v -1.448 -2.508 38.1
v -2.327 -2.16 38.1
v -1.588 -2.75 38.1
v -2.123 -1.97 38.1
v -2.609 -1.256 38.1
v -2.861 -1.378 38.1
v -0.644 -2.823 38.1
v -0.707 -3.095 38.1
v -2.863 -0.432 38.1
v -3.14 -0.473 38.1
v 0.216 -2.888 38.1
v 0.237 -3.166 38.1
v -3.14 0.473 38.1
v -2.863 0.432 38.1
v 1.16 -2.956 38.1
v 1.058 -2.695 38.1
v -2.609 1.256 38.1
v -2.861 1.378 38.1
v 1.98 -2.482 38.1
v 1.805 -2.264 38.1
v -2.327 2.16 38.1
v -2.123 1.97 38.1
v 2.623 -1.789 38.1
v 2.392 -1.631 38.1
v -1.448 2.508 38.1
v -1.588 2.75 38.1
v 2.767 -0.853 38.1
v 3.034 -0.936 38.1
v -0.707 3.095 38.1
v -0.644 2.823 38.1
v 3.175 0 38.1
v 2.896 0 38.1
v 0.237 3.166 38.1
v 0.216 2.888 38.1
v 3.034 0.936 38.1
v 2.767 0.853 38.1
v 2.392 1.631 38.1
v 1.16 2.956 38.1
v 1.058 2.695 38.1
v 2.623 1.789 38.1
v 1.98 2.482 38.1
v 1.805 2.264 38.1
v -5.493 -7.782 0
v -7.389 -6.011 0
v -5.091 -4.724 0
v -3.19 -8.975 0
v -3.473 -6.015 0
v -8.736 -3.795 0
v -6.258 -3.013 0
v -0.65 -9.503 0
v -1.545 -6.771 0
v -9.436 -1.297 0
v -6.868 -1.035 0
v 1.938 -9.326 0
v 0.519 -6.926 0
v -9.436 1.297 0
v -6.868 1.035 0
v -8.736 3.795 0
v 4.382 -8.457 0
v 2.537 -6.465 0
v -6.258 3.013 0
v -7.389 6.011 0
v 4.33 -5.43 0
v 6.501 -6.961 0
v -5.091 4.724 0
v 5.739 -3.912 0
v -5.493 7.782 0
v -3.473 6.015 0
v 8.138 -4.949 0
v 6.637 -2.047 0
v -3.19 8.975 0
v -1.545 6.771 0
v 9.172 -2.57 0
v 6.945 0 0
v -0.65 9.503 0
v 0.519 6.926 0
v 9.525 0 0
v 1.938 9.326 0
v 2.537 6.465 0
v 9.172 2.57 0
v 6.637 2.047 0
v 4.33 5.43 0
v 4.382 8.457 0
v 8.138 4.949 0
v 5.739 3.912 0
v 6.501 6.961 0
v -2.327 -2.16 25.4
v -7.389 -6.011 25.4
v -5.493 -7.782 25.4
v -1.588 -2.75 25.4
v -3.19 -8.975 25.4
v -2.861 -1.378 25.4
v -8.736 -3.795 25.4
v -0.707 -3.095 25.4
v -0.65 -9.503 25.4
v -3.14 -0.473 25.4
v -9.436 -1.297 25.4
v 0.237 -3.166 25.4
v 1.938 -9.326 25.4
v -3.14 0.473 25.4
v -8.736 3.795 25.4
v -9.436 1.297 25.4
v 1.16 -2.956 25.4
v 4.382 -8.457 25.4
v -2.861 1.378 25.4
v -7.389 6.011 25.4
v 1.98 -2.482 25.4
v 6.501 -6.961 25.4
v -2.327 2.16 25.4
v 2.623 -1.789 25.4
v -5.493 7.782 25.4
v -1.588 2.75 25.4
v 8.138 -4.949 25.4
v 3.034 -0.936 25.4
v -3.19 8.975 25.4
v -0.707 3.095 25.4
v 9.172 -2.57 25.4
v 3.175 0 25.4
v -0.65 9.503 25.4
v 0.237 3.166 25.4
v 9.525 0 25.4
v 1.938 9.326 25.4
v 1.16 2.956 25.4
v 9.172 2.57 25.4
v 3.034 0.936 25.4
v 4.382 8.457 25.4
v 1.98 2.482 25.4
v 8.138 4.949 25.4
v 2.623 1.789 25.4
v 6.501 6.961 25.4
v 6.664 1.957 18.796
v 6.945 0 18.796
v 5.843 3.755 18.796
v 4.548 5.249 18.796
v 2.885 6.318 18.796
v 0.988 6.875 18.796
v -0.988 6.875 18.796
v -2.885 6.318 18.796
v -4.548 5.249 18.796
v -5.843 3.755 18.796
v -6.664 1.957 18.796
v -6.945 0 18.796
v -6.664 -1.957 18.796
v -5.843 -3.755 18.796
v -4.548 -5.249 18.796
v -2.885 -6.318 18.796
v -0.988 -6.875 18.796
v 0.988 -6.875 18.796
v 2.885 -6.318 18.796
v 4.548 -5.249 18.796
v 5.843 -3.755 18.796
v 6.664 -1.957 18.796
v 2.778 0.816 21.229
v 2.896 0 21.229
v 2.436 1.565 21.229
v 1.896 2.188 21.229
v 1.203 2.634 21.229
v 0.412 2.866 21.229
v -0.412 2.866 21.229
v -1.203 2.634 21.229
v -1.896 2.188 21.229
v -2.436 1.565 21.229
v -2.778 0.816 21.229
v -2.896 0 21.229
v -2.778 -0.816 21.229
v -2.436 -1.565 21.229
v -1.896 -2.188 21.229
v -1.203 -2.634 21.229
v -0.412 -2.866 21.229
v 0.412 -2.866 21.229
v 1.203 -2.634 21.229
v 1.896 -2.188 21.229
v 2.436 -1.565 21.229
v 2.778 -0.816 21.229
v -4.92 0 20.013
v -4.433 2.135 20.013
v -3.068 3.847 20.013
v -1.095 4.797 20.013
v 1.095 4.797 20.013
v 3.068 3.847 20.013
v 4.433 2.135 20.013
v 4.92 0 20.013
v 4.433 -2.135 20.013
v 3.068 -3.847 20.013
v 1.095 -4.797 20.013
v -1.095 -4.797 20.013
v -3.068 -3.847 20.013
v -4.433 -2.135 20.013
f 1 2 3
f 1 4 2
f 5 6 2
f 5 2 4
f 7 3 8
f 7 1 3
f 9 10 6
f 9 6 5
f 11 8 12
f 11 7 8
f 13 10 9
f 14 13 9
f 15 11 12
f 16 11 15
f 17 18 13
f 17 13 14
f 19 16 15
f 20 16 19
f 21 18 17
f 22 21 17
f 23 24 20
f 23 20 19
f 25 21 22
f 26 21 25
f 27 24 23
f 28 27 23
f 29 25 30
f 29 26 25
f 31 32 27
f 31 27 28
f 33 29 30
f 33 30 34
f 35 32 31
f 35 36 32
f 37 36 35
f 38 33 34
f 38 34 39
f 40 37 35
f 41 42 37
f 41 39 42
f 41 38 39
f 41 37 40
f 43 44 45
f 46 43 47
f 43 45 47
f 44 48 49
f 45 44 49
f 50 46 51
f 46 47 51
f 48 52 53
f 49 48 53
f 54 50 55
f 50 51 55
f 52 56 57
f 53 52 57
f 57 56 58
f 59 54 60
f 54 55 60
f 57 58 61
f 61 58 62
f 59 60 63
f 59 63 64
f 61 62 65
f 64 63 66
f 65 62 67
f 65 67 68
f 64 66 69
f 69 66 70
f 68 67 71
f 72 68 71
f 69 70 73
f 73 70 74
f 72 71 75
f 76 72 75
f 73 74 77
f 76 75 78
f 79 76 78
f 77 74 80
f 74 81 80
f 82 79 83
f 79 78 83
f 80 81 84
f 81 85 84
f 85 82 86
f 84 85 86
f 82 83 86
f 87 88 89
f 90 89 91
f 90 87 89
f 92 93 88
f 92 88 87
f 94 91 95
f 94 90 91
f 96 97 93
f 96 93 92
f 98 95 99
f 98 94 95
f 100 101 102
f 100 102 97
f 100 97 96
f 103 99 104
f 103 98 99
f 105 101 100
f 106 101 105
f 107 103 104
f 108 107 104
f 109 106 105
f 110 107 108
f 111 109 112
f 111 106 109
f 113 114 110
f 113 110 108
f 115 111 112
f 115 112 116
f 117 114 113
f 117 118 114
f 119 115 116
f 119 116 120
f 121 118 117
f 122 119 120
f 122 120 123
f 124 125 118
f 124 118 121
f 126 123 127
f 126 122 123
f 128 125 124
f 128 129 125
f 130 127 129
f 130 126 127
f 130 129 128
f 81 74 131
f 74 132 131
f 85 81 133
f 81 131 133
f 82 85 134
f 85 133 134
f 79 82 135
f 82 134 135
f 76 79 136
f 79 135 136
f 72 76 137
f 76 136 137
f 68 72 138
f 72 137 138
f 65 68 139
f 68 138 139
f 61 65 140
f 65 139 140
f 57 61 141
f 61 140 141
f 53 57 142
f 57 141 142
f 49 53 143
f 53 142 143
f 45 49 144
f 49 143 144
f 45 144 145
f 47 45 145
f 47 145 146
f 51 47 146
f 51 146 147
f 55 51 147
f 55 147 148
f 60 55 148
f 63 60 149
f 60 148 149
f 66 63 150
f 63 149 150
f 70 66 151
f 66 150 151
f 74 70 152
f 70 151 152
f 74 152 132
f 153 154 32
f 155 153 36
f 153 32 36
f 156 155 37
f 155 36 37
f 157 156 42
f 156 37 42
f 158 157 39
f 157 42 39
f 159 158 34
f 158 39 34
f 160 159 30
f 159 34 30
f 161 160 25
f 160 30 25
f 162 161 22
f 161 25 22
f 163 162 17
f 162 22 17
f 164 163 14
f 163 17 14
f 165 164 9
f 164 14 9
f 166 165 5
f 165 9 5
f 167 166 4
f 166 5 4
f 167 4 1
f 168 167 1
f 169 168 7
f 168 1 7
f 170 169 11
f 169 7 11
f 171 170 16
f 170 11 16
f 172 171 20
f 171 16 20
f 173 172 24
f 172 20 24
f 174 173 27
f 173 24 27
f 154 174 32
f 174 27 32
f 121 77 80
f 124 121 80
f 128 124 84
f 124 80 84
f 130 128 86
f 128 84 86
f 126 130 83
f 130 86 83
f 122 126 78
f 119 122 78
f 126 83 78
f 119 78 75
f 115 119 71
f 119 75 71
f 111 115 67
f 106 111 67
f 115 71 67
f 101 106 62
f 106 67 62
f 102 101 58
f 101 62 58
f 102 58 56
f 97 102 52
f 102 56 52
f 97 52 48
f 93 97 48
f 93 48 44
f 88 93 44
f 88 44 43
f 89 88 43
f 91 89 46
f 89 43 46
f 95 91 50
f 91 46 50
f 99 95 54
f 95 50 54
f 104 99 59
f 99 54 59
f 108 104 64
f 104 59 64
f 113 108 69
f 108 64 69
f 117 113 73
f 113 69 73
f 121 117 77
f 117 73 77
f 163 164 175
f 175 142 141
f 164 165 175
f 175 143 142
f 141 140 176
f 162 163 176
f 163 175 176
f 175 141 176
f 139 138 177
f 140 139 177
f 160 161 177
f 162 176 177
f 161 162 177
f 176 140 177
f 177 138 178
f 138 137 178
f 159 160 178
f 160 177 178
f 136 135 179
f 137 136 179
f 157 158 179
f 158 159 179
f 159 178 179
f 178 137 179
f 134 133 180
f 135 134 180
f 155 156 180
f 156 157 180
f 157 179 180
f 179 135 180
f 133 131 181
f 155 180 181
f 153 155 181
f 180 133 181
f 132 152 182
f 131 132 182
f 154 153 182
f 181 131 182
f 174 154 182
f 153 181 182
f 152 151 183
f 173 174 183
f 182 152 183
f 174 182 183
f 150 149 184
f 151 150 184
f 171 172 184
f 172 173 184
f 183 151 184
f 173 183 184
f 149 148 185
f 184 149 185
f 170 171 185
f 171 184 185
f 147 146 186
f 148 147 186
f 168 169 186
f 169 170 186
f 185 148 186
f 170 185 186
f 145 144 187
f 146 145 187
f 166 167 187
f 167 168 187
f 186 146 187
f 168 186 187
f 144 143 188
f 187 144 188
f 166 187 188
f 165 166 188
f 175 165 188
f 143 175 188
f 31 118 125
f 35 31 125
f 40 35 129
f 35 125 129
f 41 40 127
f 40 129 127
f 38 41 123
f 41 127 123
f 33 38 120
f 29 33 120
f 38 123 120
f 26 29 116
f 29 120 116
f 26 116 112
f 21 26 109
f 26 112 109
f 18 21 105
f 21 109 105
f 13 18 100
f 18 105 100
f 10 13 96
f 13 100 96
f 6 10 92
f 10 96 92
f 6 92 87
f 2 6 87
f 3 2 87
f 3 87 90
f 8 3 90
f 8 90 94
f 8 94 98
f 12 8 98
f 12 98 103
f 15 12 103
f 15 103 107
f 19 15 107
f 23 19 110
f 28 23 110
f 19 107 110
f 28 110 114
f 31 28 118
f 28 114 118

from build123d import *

# Parameters (mm, degrees)
SKETCH1_R                            = 9.525
BOSS_EXTRUDE1_DEPTH                  = 25.4
SKETCH2_R                            = 3.175
BOSS_EXTRUDE2_DEPTH                  = 12.7
F_1_0_228_DIAMETER_HOLE1_D           = 5.7912
F_35_64_0_54688_DIAMETER_HOLE1_D     = 13.890752
F_35_64_0_54688_DIAMETER_HOLE1_DEPTH = 18.796
F_35_64_0_54688_DIAMETER_HOLE1_TIP   = 4.173202923


with BuildPart() as part:
    # Sketch1 → Boss-Extrude1 (new body)
    with BuildSketch(Plane.XY):
        Circle(SKETCH1_R)
    extrude(amount=BOSS_EXTRUDE1_DEPTH)

    # Sketch2 → Boss-Extrude2 (add)
    with BuildSketch(Plane.XY.offset(25.4)):
        Circle(SKETCH2_R)
    extrude(amount=BOSS_EXTRUDE2_DEPTH)

    # #1 (0.228) Diameter Hole1 (through all)
    with Locations(Plane(origin=(0, 0, 0), x_dir=(-1, 0, 0), z_dir=(0, 0, -1))):
        with Locations((0, 0)):
            Hole(F_1_0_228_DIAMETER_HOLE1_D / 2)

    # 35/64 (0.54688) Diameter Hole1
    with Locations(Plane(origin=(0, 0, 0), x_dir=(-1, 0, 0), z_dir=(0, 0, -1))):
        with Locations((0, 0)):
            Hole(F_35_64_0_54688_DIAMETER_HOLE1_D / 2, depth=F_35_64_0_54688_DIAMETER_HOLE1_DEPTH)
            with Locations((0, 0, -(F_35_64_0_54688_DIAMETER_HOLE1_DEPTH + F_35_64_0_54688_DIAMETER_HOLE1_TIP / 2))):  # 118° drill point
                Cone(0, F_35_64_0_54688_DIAMETER_HOLE1_D / 2, F_35_64_0_54688_DIAMETER_HOLE1_TIP, mode=Mode.SUBTRACT)


solid = part.part
